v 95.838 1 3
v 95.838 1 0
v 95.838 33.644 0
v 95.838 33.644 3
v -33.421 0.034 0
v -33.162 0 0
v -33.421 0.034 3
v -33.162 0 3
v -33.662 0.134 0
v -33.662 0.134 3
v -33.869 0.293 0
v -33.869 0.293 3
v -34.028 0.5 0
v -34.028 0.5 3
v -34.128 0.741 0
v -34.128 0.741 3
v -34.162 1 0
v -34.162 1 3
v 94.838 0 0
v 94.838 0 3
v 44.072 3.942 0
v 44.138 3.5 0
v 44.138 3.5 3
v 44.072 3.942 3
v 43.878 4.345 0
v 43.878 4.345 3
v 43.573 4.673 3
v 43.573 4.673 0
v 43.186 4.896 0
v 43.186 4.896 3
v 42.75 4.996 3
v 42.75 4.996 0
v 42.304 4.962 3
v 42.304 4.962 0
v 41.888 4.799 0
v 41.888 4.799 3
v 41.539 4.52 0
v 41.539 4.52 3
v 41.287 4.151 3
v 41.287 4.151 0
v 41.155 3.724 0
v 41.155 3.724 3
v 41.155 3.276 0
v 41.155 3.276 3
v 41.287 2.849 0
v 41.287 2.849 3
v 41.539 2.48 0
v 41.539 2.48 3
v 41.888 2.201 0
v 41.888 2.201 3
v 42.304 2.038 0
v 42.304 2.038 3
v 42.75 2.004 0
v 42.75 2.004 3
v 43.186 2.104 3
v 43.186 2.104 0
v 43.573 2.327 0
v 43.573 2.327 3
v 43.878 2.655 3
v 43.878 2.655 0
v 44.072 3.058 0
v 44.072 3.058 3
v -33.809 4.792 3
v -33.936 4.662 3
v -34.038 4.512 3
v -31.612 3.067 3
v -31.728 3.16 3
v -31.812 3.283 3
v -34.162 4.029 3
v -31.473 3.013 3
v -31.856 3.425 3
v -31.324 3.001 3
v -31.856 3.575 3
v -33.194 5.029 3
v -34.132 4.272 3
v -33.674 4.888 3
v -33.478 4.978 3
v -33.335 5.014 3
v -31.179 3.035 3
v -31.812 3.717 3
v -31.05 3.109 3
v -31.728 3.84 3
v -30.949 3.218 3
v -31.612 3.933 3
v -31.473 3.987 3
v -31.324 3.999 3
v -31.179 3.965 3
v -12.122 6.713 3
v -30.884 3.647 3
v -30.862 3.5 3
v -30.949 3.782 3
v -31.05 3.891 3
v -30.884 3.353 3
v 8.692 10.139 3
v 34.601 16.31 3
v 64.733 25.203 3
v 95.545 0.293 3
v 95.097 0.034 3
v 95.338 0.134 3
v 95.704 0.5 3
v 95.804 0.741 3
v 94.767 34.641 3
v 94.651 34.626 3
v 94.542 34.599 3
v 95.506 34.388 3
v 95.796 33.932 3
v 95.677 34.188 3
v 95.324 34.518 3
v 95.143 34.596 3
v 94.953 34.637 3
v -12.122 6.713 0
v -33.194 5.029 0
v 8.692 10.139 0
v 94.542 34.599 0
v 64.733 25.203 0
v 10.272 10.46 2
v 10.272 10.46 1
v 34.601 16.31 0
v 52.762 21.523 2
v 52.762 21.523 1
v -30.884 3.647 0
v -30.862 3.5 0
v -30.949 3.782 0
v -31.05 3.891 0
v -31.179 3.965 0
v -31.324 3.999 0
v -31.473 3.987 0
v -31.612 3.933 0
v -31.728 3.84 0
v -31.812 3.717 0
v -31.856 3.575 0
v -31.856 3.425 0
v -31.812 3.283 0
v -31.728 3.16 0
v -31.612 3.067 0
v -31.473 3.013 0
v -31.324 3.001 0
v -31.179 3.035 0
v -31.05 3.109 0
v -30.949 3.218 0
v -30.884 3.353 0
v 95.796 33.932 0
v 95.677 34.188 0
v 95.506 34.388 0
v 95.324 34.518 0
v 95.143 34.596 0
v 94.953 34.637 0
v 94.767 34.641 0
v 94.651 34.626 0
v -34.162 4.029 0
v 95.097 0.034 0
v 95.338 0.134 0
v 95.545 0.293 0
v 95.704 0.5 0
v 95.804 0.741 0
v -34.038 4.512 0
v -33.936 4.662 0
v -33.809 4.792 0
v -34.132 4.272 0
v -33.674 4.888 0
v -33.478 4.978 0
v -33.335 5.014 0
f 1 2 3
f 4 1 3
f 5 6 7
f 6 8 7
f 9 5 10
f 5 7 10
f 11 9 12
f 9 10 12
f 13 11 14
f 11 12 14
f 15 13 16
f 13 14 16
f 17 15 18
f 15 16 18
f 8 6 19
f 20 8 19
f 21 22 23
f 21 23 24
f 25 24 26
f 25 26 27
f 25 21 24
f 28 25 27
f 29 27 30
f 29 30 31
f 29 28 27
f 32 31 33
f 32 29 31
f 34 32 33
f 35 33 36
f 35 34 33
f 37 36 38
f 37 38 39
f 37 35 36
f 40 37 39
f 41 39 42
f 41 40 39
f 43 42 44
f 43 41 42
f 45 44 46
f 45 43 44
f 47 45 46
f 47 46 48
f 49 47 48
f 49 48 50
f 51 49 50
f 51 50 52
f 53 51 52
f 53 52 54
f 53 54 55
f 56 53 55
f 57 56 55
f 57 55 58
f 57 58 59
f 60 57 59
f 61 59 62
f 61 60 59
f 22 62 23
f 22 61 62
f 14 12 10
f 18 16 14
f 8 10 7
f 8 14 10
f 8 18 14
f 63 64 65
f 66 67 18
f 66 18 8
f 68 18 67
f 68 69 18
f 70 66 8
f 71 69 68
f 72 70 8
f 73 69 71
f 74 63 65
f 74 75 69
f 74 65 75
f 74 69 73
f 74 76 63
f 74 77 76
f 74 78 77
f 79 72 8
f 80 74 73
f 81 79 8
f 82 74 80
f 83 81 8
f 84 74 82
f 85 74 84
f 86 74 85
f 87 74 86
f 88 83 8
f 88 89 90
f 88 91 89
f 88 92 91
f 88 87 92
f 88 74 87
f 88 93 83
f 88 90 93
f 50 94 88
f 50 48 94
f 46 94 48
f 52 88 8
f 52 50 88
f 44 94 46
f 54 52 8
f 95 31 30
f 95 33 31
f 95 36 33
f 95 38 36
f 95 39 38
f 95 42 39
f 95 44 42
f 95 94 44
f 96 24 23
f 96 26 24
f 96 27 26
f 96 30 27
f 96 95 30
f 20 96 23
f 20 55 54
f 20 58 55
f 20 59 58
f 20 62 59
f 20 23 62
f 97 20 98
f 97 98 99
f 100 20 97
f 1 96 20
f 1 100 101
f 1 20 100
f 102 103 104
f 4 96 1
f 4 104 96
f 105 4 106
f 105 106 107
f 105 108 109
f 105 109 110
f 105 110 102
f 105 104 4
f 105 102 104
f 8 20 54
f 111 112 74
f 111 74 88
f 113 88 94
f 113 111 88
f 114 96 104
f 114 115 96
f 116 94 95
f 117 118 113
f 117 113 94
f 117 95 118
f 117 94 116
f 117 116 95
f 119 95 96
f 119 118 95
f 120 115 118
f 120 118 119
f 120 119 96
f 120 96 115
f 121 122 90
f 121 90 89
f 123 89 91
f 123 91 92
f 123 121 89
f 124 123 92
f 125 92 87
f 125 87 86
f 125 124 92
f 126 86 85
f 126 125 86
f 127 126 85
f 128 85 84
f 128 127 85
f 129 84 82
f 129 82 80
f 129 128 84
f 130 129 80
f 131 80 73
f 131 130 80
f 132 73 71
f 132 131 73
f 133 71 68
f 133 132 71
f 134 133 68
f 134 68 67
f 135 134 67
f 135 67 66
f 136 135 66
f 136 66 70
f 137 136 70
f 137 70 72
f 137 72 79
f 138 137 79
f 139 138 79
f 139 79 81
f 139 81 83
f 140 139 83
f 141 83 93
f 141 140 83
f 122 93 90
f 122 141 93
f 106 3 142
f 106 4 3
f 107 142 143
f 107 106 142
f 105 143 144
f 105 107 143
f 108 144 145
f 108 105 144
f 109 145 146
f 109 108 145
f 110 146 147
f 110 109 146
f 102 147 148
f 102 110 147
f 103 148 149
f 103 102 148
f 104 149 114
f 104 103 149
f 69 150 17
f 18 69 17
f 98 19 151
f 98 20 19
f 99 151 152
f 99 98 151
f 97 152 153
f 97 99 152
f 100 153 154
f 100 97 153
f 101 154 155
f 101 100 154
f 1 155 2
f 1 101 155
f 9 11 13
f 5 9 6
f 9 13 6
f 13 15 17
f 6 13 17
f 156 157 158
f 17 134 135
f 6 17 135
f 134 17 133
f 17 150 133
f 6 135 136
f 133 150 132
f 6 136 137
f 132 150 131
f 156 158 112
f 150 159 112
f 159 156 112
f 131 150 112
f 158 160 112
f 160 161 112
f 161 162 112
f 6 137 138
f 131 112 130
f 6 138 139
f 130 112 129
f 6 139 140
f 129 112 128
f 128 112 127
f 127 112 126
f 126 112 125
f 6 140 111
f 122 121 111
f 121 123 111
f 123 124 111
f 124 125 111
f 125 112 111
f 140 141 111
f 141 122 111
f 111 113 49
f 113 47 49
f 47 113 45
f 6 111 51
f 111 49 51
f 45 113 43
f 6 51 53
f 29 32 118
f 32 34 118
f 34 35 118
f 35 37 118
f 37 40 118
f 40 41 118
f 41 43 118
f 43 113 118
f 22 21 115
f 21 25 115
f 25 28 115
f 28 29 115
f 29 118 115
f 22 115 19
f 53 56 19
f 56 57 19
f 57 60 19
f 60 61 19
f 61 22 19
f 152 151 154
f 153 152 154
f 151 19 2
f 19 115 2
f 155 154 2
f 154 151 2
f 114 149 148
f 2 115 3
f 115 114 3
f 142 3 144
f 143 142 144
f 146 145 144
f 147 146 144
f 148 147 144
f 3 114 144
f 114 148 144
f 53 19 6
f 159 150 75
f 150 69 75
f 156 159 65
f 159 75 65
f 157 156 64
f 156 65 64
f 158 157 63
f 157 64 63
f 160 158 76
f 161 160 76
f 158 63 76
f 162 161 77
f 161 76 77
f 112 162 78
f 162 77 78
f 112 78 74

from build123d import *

# Parameters (mm, degrees)
SKETCH_1_R      = 0.5
SKETCH_1_R_2    = 1.5
EXTRUDE_1_DEPTH = 3
FILLET_1_R      = 1


with BuildPart() as part:
    # 草图1 → 凸台-拉伸1 (new body)
    with BuildSketch(Plane.XY):
        with BuildLine():
            Line((-34.1617357, 0), (95.8382643, 0))
            Line((95.8382643, 0), (95.8382643, 35))
            add(Edge.make_bspline(
                [(-34.1617357, 5), (10.689319489, 6.2279178), (53.602553401, 21.947320234), (95.8382643, 35)],
                knots=[0, 0, 0, 0, 1, 1, 1, 1], degree=3))
            Line((-34.1617357, 5), (-34.1617357, 0))
        make_face()
        with Locations((-31.3617357, 3.5)):
            Circle(SKETCH_1_R, mode=Mode.SUBTRACT)
        with Locations((42.6382643, 3.5)):
            Circle(SKETCH_1_R_2, mode=Mode.SUBTRACT)
    extrude(amount=EXTRUDE_1_DEPTH)

    # 圆角1
    fillet_1_edges = [part.edges().sort_by_distance(p)[0] for p in [
        (-34.1617357, 0, 1.5),
        (-34.1617357, 5, 1.5),
        (95.8382643, 35, 1.5),
        (95.8382643, 0, 1.5),
    ]]
    fillet(fillet_1_edges, radius=FILLET_1_R)


solid = part.part
